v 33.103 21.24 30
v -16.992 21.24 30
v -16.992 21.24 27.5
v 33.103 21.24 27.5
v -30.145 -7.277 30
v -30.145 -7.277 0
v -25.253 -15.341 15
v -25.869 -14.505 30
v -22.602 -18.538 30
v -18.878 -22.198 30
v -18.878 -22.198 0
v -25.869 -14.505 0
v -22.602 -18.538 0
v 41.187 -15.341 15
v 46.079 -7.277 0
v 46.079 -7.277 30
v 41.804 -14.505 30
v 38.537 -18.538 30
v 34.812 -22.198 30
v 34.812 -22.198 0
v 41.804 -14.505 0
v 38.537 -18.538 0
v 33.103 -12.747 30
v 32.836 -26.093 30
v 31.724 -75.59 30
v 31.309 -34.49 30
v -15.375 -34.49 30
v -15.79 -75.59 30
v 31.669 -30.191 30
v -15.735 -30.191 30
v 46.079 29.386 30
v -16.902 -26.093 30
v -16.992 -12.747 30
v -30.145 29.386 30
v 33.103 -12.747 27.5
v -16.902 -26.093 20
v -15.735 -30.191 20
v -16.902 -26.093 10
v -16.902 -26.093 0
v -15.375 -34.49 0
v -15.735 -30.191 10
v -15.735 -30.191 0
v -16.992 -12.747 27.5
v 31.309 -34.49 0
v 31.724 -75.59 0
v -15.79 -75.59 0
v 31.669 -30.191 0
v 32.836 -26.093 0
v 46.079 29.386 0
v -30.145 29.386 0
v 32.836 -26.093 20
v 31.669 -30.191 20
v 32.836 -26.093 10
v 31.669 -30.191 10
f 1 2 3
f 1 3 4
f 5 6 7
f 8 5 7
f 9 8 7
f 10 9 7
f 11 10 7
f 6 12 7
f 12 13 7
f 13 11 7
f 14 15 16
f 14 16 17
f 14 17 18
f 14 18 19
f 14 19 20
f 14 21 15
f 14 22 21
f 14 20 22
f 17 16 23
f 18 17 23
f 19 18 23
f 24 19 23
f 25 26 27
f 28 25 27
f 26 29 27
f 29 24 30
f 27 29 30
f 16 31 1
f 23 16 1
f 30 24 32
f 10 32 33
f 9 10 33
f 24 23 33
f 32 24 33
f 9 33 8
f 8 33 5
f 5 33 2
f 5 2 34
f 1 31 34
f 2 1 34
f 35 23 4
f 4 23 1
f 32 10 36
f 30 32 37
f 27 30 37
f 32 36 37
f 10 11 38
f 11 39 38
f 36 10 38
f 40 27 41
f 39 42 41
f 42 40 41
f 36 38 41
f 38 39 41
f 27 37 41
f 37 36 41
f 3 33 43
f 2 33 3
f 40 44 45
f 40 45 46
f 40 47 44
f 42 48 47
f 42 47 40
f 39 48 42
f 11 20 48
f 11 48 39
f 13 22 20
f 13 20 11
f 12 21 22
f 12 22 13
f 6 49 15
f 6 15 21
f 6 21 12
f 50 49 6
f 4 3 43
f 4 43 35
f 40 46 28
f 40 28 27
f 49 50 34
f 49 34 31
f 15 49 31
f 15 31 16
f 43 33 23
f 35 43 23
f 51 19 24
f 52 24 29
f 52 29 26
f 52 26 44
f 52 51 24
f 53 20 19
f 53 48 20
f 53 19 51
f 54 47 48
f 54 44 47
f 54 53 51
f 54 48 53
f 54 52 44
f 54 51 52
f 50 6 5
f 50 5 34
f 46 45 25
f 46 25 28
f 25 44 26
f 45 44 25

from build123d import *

# Parameters (mm, degrees)
BOSS_EXTRUDE1_DEPTH = 30
SKETCH2_W           = 50.095183997
SKETCH2_H           = 33.986838613
CUT_EXTRUDE1_DEPTH  = 2.5


with BuildPart() as part:
    # Sketch1 → Boss-Extrude1 (new body)
    with BuildSketch(Plane.XY):
        with BuildLine():
            Line((31.309465796, -34.490317077), (31.723853575, -75.590275849))
            Line((31.723853575, -75.590275849), (-15.789641544, -75.590275849))
            Line((-15.789641544, -75.590275849), (-15.375253765, -34.490317077))
            add(Edge.make_bspline(
                [(-18.877545921, -22.198221739), (-16.498314262, -25.992208525), (-15.330883543, -30.089573637), (-15.375253765, -34.490317077)],
                knots=[0, 0, 0, 0, 1, 1, 1, 1], degree=3))
            add(Edge.make_bspline(
                [(-30.14454169, -7.27706518), (-25.994179114, -15.945334243), (-18.877545921, -22.198221739)],
                knots=[0, 0, 0, 1, 1, 1], degree=2))
            Line((-30.14454169, -7.27706518), (-30.14454169, 29.385543018))
            Line((-30.14454169, 29.385543018), (25.046286628, 29.385543018))
            Line((25.046286628, 29.385543018), (46.078753721, 29.385543018))
            Line((46.078753721, 29.385543018), (46.078753721, -7.27706518))
            add(Edge.make_bspline(
                [(46.078753721, -7.27706518), (41.928391145, -15.945334243), (34.811757952, -22.198221739)],
                knots=[0, 0, 0, 1, 1, 1], degree=2))
            add(Edge.make_bspline(
                [(34.811757952, -22.198221739), (32.432526292, -25.992208525), (31.265095574, -30.089573637), (31.309465796, -34.490317077)],
                knots=[0, 0, 0, 0, 1, 1, 1, 1], degree=3))
        make_face()
    extrude(amount=BOSS_EXTRUDE1_DEPTH)

    # Sketch2 → Cut-Extrude1 (cut)
    with BuildSketch(Plane.XY.offset(30)):
        with Locations((8.055613407, 4.246417782)):
            Rectangle(SKETCH2_W, SKETCH2_H)
    extrude(amount=-CUT_EXTRUDE1_DEPTH, mode=Mode.SUBTRACT)


solid = part.part
